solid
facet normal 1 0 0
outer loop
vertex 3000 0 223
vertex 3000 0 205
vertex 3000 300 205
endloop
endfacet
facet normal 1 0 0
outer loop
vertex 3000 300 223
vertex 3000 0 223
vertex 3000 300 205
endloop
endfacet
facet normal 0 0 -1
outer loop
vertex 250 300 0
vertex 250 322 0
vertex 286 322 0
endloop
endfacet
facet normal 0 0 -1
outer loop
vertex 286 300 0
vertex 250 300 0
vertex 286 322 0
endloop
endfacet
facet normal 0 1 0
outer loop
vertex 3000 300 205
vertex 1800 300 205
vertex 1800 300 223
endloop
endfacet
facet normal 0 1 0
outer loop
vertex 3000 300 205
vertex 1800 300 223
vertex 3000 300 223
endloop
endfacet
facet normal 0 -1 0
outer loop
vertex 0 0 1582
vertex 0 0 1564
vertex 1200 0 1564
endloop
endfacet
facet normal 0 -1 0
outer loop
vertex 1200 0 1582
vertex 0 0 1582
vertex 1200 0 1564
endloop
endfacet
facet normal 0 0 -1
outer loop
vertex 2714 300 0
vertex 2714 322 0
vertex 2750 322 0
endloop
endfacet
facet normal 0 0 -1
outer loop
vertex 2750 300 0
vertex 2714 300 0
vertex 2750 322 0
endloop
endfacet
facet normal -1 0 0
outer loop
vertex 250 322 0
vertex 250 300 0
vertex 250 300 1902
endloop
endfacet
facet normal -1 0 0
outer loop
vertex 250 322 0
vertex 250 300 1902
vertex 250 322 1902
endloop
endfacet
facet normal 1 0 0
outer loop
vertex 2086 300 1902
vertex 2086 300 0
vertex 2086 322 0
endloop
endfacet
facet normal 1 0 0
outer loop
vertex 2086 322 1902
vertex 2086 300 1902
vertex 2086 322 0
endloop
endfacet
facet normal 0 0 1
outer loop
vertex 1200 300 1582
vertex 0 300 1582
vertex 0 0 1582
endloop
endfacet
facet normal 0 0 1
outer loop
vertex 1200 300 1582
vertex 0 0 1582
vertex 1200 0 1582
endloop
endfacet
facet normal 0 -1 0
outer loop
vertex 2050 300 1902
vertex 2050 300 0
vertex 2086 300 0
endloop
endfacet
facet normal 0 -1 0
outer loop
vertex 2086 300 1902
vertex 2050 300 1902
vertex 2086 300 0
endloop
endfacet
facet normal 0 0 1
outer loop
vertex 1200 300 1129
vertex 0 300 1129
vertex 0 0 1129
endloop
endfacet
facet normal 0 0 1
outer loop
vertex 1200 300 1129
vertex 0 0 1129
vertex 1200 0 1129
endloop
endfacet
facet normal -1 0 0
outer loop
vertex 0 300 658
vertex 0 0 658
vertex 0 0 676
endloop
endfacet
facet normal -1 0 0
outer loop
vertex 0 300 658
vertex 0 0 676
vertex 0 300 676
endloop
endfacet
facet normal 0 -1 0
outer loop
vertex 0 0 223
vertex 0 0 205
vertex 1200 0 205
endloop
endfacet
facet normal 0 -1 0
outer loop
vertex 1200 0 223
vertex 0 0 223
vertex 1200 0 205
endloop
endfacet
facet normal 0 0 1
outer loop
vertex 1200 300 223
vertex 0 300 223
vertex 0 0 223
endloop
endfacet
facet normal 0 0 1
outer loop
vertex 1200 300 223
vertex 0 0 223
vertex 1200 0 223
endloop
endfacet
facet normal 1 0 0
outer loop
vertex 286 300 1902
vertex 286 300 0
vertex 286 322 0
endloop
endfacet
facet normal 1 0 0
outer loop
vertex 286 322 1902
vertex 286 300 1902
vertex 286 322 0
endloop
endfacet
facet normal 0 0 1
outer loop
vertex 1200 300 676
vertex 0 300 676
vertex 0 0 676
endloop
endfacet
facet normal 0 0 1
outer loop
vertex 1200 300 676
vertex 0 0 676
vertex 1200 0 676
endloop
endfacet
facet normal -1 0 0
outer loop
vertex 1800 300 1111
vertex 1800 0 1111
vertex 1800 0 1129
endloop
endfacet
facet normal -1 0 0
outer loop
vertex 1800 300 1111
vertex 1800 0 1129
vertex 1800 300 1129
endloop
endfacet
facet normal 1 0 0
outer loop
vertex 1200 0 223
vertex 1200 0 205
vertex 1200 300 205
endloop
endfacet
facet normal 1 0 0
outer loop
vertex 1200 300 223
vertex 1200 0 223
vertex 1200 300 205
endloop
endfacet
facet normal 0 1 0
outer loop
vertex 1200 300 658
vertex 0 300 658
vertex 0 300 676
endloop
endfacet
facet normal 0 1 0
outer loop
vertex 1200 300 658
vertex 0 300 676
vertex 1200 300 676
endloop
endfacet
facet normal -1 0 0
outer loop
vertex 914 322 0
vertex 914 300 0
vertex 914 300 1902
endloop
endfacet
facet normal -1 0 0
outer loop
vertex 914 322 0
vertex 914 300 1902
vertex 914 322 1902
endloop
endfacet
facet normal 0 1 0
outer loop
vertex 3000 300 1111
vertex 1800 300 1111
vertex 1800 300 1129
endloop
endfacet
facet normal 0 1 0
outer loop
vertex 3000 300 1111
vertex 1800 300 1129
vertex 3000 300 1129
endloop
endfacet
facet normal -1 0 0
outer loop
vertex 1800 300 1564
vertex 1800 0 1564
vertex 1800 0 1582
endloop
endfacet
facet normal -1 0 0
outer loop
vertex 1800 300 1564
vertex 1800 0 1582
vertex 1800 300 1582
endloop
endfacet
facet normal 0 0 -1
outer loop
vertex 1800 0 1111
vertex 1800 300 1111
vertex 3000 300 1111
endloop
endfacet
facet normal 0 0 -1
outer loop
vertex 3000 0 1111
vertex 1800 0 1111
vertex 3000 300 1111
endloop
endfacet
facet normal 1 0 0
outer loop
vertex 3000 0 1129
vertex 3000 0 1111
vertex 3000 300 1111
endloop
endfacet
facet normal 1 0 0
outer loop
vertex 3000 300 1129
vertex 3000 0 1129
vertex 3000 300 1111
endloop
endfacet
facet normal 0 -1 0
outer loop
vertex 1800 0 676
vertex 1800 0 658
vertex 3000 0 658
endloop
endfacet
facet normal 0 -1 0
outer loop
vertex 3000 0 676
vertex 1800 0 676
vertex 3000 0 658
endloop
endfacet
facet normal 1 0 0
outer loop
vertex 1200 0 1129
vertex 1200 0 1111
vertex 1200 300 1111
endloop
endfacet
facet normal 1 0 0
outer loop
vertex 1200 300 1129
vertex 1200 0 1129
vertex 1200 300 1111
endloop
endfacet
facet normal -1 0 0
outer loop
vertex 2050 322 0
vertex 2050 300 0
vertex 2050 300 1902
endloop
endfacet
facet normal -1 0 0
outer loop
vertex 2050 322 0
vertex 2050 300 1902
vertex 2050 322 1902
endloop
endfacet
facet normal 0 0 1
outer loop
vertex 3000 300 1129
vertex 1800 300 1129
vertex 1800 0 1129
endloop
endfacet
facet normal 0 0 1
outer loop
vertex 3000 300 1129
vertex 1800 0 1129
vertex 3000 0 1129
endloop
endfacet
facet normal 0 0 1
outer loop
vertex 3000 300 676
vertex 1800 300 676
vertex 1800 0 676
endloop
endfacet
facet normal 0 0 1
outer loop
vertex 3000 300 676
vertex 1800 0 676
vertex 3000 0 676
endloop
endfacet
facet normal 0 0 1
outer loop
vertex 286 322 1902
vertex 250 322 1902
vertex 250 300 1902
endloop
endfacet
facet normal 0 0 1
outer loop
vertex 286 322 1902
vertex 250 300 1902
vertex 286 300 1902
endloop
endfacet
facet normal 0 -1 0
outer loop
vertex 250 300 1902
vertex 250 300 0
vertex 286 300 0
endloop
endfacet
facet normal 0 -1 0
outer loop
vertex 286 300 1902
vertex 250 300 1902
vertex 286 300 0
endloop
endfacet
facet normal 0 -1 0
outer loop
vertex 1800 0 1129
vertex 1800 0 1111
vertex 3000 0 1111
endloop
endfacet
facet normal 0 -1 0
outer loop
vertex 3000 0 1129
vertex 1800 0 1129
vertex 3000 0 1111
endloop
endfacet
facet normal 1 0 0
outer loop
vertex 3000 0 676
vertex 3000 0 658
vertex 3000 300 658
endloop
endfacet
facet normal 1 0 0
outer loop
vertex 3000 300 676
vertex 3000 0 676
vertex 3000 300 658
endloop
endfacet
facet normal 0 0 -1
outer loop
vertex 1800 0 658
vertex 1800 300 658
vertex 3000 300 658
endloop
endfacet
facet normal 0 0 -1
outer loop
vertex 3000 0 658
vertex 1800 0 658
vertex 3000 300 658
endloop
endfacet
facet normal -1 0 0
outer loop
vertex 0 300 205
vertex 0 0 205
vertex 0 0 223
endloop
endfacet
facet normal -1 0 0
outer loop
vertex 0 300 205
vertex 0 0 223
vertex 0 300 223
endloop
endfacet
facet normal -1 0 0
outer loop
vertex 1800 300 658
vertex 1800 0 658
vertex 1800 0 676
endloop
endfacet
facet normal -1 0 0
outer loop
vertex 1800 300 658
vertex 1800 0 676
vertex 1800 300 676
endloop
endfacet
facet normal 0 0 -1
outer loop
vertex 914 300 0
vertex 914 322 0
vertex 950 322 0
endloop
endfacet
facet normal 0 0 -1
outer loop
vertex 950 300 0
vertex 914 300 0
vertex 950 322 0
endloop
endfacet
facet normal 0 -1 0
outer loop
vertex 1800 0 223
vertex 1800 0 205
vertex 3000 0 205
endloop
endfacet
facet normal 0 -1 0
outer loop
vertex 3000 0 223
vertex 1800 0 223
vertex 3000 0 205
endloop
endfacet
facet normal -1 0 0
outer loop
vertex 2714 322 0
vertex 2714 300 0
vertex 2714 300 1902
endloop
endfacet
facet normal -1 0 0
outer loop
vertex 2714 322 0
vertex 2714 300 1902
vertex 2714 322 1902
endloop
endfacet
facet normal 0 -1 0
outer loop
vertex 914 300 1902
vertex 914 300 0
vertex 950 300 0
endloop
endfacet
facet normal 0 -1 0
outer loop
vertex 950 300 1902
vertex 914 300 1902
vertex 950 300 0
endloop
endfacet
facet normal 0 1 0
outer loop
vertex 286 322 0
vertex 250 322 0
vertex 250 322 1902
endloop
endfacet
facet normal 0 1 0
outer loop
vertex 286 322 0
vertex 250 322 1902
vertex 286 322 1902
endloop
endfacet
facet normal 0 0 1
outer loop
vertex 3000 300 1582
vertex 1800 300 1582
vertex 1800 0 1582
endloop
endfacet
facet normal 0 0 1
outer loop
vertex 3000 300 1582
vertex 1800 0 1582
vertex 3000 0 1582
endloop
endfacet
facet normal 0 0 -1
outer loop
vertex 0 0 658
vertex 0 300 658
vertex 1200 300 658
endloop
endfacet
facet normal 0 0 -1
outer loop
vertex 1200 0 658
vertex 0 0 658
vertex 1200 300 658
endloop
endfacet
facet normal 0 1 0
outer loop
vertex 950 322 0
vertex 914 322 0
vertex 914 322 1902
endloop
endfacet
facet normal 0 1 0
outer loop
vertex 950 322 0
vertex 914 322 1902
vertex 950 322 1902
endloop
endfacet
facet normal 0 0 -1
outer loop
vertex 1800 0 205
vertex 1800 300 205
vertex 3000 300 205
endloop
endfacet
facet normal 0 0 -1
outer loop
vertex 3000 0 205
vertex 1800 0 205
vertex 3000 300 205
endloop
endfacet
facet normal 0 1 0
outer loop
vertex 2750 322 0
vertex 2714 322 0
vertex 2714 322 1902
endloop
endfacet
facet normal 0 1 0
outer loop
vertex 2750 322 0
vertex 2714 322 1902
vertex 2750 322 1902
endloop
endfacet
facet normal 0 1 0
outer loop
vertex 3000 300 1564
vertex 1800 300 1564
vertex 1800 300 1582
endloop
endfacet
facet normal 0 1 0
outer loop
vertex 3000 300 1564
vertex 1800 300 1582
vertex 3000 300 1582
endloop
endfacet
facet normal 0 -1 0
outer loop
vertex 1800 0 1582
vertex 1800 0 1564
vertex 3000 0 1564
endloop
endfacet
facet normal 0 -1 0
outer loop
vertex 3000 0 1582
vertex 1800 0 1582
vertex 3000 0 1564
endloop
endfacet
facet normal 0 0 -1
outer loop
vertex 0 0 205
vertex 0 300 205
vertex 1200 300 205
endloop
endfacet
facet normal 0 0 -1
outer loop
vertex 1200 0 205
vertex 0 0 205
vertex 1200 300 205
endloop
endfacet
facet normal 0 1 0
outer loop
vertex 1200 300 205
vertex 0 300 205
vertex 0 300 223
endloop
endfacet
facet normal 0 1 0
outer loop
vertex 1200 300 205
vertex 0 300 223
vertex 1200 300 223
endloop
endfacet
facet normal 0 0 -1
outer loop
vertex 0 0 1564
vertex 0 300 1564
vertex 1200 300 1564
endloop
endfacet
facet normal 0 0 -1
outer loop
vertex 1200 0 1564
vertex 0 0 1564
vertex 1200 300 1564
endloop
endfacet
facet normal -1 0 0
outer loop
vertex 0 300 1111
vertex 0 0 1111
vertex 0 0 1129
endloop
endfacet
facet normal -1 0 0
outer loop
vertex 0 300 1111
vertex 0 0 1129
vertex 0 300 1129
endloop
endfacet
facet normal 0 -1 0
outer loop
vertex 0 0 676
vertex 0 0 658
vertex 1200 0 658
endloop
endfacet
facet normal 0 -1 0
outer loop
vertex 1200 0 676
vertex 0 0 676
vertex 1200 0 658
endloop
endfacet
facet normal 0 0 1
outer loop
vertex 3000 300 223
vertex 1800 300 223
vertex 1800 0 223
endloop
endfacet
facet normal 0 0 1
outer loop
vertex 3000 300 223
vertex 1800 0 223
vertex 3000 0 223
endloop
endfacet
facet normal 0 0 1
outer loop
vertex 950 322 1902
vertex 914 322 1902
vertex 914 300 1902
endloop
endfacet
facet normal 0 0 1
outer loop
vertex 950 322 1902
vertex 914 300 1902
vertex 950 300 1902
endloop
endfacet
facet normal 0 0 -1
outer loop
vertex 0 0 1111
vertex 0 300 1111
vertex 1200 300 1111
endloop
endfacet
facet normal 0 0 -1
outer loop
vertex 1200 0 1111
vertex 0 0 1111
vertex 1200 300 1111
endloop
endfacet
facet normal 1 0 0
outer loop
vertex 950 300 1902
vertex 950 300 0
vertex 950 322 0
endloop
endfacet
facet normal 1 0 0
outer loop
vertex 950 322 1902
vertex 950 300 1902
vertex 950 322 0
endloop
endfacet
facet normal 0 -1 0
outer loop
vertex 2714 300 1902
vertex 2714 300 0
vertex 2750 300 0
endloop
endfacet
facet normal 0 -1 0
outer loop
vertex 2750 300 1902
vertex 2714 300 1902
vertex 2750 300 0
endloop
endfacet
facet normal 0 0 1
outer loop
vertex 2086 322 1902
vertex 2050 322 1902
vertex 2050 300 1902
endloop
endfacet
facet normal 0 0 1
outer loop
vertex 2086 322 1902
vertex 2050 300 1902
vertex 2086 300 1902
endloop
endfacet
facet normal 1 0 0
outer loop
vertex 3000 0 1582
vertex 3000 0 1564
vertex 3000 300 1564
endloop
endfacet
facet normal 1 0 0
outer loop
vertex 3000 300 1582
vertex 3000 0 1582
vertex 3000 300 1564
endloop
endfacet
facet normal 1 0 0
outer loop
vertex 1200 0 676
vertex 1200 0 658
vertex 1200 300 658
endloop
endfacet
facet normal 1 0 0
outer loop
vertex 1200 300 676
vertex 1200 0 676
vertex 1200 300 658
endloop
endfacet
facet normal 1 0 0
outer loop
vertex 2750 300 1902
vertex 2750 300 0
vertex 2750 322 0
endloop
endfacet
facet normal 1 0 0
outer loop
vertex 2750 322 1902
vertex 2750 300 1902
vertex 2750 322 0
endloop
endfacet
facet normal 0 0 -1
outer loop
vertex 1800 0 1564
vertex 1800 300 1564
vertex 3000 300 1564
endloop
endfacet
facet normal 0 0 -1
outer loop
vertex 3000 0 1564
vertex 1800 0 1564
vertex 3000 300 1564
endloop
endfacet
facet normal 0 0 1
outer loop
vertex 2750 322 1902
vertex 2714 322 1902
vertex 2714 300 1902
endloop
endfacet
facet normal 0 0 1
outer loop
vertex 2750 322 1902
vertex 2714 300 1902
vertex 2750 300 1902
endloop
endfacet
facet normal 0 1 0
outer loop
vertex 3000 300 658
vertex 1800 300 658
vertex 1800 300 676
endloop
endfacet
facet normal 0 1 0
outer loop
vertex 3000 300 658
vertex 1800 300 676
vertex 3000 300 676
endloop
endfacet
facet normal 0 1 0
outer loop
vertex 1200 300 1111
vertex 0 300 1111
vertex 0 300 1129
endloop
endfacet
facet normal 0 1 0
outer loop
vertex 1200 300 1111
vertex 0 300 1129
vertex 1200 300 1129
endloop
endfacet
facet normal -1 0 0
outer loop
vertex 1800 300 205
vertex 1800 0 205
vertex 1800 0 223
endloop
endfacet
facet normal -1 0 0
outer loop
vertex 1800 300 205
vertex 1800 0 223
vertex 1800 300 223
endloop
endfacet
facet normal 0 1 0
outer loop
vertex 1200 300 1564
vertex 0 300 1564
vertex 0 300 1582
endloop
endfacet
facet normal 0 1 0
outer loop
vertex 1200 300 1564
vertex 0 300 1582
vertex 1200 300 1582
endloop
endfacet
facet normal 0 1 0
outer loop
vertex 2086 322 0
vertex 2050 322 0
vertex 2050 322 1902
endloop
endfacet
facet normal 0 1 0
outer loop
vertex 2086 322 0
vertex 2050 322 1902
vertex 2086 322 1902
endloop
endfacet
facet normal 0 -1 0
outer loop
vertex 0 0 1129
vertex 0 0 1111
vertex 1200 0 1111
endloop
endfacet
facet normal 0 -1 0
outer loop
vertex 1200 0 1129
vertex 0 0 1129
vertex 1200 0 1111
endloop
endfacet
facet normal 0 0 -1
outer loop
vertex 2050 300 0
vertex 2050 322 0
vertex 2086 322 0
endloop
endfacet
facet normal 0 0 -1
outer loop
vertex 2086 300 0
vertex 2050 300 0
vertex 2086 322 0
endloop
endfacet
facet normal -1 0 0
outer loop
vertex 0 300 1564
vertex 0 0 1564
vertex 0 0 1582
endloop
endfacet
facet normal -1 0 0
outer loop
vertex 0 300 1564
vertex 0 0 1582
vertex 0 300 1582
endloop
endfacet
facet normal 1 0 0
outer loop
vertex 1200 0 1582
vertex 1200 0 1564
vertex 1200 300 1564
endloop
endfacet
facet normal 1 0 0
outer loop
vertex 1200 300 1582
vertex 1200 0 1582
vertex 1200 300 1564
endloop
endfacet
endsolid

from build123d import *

# Parameters (mm, degrees)
PANELXY_W        = 1200
PANELXY_H        = 300
PANELXY_DEPTH    = 18
PANELZY_W        = 36
PANELZY_H        = 22
PANELZY_DEPTH    = 1902
PANELZY001_W     = 36
PANELZY001_H     = 22
PANELZY001_DEPTH = 1902
PANELXY001_W     = 1200
PANELXY001_H     = 300
PANELXY001_DEPTH = 18
PANELXY002_W     = 1200
PANELXY002_H     = 300
PANELXY002_DEPTH = 18
PANELXY003_W     = 1200
PANELXY003_H     = 300
PANELXY003_DEPTH = 18
PANELXY004_W     = 1200
PANELXY004_H     = 300
PANELXY004_DEPTH = 18
PANELXY005_W     = 1200
PANELXY005_H     = 300
PANELXY005_DEPTH = 18
PANELXY006_W     = 1200
PANELXY006_H     = 300
PANELXY006_DEPTH = 18
PANELXY007_W     = 1200
PANELXY007_H     = 300
PANELXY007_DEPTH = 18
PANELZY002_W     = 36
PANELZY002_H     = 22
PANELZY002_DEPTH = 1902
PANELZY003_W     = 36
PANELZY003_H     = 22
PANELZY003_DEPTH = 1902


with BuildPart() as panelxy:
    # panelXY → panelXY (new body)
    with BuildSketch(Plane.XY.offset(205)):
        with Locations((600, 150)):
            Rectangle(PANELXY_W, PANELXY_H)
    extrude(amount=PANELXY_DEPTH)


with BuildPart() as panelzy:
    # panelZY → panelZY (new body)
    with BuildSketch(Plane(origin=(250, 300, 0), x_dir=(1, 0, 0), z_dir=(0, 0, 1))):
        with Locations((18, 11)):
            Rectangle(PANELZY_W, PANELZY_H)
    extrude(amount=PANELZY_DEPTH)


with BuildPart() as panelzy001:
    # panelZY001 → panelZY001 (new body)
    with BuildSketch(Plane(origin=(914, 300, 0), x_dir=(1, 0, 0), z_dir=(0, 0, 1))):
        with Locations((18, 11)):
            Rectangle(PANELZY001_W, PANELZY001_H)
    extrude(amount=PANELZY001_DEPTH)


with BuildPart() as panelxy001:
    # panelXY001 → panelXY001 (new body)
    with BuildSketch(Plane.XY.offset(658)):
        with Locations((600, 150)):
            Rectangle(PANELXY001_W, PANELXY001_H)
    extrude(amount=PANELXY001_DEPTH)


with BuildPart() as panelxy002:
    # panelXY002 → panelXY002 (new body)
    with BuildSketch(Plane.XY.offset(1111)):
        with Locations((600, 150)):
            Rectangle(PANELXY002_W, PANELXY002_H)
    extrude(amount=PANELXY002_DEPTH)


with BuildPart() as panelxy003:
    # panelXY003 → panelXY003 (new body)
    with BuildSketch(Plane.XY.offset(1564)):
        with Locations((600, 150)):
            Rectangle(PANELXY003_W, PANELXY003_H)
    extrude(amount=PANELXY003_DEPTH)


with BuildPart() as panelxy004:
    # panelXY004 → panelXY004 (new body)
    with BuildSketch(Plane(origin=(1800, 0, 205), x_dir=(1, 0, 0), z_dir=(0, 0, 1))):
        with Locations((600, 150)):
            Rectangle(PANELXY004_W, PANELXY004_H)
    extrude(amount=PANELXY004_DEPTH)


with BuildPart() as panelxy005:
    # panelXY005 → panelXY005 (new body)
    with BuildSketch(Plane(origin=(1800, 0, 658), x_dir=(1, 0, 0), z_dir=(0, 0, 1))):
        with Locations((600, 150)):
            Rectangle(PANELXY005_W, PANELXY005_H)
    extrude(amount=PANELXY005_DEPTH)


with BuildPart() as panelxy006:
    # panelXY006 → panelXY006 (new body)
    with BuildSketch(Plane(origin=(1800, 0, 1111), x_dir=(1, 0, 0), z_dir=(0, 0, 1))):
        with Locations((600, 150)):
            Rectangle(PANELXY006_W, PANELXY006_H)
    extrude(amount=PANELXY006_DEPTH)


with BuildPart() as panelxy007:
    # panelXY007 → panelXY007 (new body)
    with BuildSketch(Plane(origin=(1800, 0, 1564), x_dir=(1, 0, 0), z_dir=(0, 0, 1))):
        with Locations((600, 150)):
            Rectangle(PANELXY007_W, PANELXY007_H)
    extrude(amount=PANELXY007_DEPTH)


with BuildPart() as panelzy002:
    # panelZY002 → panelZY002 (new body)
    with BuildSketch(Plane(origin=(2050, 300, 0), x_dir=(1, 0, 0), z_dir=(0, 0, 1))):
        with Locations((18, 11)):
            Rectangle(PANELZY002_W, PANELZY002_H)
    extrude(amount=PANELZY002_DEPTH)


with BuildPart() as panelzy003:
    # panelZY003 → panelZY003 (new body)
    with BuildSketch(Plane(origin=(2714, 300, 0), x_dir=(1, 0, 0), z_dir=(0, 0, 1))):
        with Locations((18, 11)):
            Rectangle(PANELZY003_W, PANELZY003_H)
    extrude(amount=PANELZY003_DEPTH)


solid = Compound([panelxy.part, panelzy.part, panelzy001.part, panelxy001.part, panelxy002.part, panelxy003.part, panelxy004.part, panelxy005.part, panelxy006.part, panelxy007.part, panelzy002.part, panelzy003.part])
